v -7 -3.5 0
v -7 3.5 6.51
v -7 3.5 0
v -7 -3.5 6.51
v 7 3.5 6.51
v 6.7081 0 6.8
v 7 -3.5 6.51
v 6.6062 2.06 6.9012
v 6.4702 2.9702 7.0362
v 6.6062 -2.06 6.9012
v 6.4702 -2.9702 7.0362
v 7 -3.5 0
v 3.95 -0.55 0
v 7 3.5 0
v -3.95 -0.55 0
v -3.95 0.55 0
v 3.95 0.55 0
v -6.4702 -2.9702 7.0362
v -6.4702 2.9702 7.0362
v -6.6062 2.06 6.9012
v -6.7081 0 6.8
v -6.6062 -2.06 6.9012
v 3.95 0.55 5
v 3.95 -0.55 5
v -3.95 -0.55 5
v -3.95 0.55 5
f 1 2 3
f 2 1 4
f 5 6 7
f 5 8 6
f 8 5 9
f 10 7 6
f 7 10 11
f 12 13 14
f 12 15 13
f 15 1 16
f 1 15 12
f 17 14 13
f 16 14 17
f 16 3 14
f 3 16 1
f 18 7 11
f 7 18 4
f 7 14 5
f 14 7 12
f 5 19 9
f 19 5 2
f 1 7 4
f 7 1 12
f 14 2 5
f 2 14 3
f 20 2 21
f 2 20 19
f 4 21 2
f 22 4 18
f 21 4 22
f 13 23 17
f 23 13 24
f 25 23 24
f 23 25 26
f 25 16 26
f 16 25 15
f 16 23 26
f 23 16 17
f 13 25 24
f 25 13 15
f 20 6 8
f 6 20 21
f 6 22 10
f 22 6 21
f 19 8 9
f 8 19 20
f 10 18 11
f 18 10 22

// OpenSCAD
// Linear-fader knob (cap) for the ODJ controller — Pioneer-style:
// low, wide, slightly chamfered on top with a finger-rest indent
// running across the cap (perpendicular to fader travel).
//
// Constraint from the fader hardware: the cap can extend at most
// 3.5 mm forward or backward of the stem along the travel axis, or
// the mounting screws at either end of the slider's travel will foul
// at extreme positions. So the cap length along travel is capped at
// 7 mm. Width (perpendicular to travel) is unconstrained — wider is
// easier to grip and adds nothing to the screw clearance problem.
//
// Stem (Alps/Bourns-style slide pot): 0.8 mm thin × 7.5 mm long ×
// 4.5 mm protrudes above the slider. The stem's LONG axis is
// perpendicular to fader travel (standard convention), so the slot's
// long axis aligns with the cap's WIDTH, not its length.
//
// Print right-side-up (top face up). The slot opens onto the build
// plate as a tall narrow rectangular hole — no overhangs, no support.

// ===== Dimensions (mm) =====

// Cap outer envelope. cap_l is the constrained axis.
cap_l = 7;      // along fader travel  (3.5 mm each side of stem)
cap_w = 14;     // perpendicular to travel — finger grip
cap_h = 8;      // total height above the slider's top face

// Stem socket — slip-fit with FDM tolerances.
stem_nominal_w = 0.8;    // narrow axis (along travel)
stem_nominal_l = 7.5;    // long axis (perpendicular to travel)
stem_protrude  = 4.5;
slot_clr_w = 0.3;
slot_clr_l = 0.4;
slot_w = stem_nominal_w + slot_clr_w;   // narrow → along Y (cap_l axis)
slot_l = stem_nominal_l + slot_clr_l;   // long   → along X (cap_w axis)
slot_depth = stem_protrude + 0.5;       // 0.5 mm extra so the cap bottoms on the slider, not the stem

// Top profile: 1.5 mm linear chamfer around the top edges, plus a
// shallow cross-cap finger groove giving the cap its Pioneer look and
// a tactile centre-line. The groove runs along the X axis
// (perpendicular to travel) so a finger naturally rests across it
// when pushing the cap up/down the fader slot.
chamfer       = 1.5;
groove_d      = 6;       // chord of the finger groove
groove_depth  = 1.2;

// ===== Geometry =====

module body() {
    // Linear chamfer on the top edges: hull between a full-size
    // rectangle at z = cap_h - chamfer and a shrunken one at z = cap_h.
    hull() {
        translate([-cap_w/2, -cap_l/2, 0])
            cube([cap_w, cap_l, cap_h - chamfer + 0.01]);
        translate([
            -(cap_w - 2 * chamfer)/2,
            -(cap_l - 2 * chamfer)/2,
            cap_h - 0.01
        ])
            cube([
                cap_w - 2 * chamfer,
                cap_l - 2 * chamfer,
                0.01
            ]);
    }
}

// Stem socket: rectangular hole rising from the bottom face. Long
// axis along X = perpendicular to fader travel (cap_w direction);
// narrow axis along Y = along travel (cap_l direction).
module stem_socket() {
    translate([-slot_l/2, -slot_w/2, -0.01])
        cube([slot_l, slot_w, slot_depth + 0.01]);
}

// Finger groove on the top face — a cylinder lying along the X axis
// (perpendicular to travel), scooped out so a finger rests across the
// cap centred over the stem.
module finger_groove() {
    r = (pow(cap_w/2, 2) + pow(groove_depth, 2)) / (2 * groove_depth);
    translate([0, 0, cap_h + r - groove_depth])
        rotate([0, 90, 0])
            cylinder(h = cap_w + 2, r = r, center = true, $fn = 64);
}

difference() {
    body();
    stem_socket();
    finger_groove();
}
